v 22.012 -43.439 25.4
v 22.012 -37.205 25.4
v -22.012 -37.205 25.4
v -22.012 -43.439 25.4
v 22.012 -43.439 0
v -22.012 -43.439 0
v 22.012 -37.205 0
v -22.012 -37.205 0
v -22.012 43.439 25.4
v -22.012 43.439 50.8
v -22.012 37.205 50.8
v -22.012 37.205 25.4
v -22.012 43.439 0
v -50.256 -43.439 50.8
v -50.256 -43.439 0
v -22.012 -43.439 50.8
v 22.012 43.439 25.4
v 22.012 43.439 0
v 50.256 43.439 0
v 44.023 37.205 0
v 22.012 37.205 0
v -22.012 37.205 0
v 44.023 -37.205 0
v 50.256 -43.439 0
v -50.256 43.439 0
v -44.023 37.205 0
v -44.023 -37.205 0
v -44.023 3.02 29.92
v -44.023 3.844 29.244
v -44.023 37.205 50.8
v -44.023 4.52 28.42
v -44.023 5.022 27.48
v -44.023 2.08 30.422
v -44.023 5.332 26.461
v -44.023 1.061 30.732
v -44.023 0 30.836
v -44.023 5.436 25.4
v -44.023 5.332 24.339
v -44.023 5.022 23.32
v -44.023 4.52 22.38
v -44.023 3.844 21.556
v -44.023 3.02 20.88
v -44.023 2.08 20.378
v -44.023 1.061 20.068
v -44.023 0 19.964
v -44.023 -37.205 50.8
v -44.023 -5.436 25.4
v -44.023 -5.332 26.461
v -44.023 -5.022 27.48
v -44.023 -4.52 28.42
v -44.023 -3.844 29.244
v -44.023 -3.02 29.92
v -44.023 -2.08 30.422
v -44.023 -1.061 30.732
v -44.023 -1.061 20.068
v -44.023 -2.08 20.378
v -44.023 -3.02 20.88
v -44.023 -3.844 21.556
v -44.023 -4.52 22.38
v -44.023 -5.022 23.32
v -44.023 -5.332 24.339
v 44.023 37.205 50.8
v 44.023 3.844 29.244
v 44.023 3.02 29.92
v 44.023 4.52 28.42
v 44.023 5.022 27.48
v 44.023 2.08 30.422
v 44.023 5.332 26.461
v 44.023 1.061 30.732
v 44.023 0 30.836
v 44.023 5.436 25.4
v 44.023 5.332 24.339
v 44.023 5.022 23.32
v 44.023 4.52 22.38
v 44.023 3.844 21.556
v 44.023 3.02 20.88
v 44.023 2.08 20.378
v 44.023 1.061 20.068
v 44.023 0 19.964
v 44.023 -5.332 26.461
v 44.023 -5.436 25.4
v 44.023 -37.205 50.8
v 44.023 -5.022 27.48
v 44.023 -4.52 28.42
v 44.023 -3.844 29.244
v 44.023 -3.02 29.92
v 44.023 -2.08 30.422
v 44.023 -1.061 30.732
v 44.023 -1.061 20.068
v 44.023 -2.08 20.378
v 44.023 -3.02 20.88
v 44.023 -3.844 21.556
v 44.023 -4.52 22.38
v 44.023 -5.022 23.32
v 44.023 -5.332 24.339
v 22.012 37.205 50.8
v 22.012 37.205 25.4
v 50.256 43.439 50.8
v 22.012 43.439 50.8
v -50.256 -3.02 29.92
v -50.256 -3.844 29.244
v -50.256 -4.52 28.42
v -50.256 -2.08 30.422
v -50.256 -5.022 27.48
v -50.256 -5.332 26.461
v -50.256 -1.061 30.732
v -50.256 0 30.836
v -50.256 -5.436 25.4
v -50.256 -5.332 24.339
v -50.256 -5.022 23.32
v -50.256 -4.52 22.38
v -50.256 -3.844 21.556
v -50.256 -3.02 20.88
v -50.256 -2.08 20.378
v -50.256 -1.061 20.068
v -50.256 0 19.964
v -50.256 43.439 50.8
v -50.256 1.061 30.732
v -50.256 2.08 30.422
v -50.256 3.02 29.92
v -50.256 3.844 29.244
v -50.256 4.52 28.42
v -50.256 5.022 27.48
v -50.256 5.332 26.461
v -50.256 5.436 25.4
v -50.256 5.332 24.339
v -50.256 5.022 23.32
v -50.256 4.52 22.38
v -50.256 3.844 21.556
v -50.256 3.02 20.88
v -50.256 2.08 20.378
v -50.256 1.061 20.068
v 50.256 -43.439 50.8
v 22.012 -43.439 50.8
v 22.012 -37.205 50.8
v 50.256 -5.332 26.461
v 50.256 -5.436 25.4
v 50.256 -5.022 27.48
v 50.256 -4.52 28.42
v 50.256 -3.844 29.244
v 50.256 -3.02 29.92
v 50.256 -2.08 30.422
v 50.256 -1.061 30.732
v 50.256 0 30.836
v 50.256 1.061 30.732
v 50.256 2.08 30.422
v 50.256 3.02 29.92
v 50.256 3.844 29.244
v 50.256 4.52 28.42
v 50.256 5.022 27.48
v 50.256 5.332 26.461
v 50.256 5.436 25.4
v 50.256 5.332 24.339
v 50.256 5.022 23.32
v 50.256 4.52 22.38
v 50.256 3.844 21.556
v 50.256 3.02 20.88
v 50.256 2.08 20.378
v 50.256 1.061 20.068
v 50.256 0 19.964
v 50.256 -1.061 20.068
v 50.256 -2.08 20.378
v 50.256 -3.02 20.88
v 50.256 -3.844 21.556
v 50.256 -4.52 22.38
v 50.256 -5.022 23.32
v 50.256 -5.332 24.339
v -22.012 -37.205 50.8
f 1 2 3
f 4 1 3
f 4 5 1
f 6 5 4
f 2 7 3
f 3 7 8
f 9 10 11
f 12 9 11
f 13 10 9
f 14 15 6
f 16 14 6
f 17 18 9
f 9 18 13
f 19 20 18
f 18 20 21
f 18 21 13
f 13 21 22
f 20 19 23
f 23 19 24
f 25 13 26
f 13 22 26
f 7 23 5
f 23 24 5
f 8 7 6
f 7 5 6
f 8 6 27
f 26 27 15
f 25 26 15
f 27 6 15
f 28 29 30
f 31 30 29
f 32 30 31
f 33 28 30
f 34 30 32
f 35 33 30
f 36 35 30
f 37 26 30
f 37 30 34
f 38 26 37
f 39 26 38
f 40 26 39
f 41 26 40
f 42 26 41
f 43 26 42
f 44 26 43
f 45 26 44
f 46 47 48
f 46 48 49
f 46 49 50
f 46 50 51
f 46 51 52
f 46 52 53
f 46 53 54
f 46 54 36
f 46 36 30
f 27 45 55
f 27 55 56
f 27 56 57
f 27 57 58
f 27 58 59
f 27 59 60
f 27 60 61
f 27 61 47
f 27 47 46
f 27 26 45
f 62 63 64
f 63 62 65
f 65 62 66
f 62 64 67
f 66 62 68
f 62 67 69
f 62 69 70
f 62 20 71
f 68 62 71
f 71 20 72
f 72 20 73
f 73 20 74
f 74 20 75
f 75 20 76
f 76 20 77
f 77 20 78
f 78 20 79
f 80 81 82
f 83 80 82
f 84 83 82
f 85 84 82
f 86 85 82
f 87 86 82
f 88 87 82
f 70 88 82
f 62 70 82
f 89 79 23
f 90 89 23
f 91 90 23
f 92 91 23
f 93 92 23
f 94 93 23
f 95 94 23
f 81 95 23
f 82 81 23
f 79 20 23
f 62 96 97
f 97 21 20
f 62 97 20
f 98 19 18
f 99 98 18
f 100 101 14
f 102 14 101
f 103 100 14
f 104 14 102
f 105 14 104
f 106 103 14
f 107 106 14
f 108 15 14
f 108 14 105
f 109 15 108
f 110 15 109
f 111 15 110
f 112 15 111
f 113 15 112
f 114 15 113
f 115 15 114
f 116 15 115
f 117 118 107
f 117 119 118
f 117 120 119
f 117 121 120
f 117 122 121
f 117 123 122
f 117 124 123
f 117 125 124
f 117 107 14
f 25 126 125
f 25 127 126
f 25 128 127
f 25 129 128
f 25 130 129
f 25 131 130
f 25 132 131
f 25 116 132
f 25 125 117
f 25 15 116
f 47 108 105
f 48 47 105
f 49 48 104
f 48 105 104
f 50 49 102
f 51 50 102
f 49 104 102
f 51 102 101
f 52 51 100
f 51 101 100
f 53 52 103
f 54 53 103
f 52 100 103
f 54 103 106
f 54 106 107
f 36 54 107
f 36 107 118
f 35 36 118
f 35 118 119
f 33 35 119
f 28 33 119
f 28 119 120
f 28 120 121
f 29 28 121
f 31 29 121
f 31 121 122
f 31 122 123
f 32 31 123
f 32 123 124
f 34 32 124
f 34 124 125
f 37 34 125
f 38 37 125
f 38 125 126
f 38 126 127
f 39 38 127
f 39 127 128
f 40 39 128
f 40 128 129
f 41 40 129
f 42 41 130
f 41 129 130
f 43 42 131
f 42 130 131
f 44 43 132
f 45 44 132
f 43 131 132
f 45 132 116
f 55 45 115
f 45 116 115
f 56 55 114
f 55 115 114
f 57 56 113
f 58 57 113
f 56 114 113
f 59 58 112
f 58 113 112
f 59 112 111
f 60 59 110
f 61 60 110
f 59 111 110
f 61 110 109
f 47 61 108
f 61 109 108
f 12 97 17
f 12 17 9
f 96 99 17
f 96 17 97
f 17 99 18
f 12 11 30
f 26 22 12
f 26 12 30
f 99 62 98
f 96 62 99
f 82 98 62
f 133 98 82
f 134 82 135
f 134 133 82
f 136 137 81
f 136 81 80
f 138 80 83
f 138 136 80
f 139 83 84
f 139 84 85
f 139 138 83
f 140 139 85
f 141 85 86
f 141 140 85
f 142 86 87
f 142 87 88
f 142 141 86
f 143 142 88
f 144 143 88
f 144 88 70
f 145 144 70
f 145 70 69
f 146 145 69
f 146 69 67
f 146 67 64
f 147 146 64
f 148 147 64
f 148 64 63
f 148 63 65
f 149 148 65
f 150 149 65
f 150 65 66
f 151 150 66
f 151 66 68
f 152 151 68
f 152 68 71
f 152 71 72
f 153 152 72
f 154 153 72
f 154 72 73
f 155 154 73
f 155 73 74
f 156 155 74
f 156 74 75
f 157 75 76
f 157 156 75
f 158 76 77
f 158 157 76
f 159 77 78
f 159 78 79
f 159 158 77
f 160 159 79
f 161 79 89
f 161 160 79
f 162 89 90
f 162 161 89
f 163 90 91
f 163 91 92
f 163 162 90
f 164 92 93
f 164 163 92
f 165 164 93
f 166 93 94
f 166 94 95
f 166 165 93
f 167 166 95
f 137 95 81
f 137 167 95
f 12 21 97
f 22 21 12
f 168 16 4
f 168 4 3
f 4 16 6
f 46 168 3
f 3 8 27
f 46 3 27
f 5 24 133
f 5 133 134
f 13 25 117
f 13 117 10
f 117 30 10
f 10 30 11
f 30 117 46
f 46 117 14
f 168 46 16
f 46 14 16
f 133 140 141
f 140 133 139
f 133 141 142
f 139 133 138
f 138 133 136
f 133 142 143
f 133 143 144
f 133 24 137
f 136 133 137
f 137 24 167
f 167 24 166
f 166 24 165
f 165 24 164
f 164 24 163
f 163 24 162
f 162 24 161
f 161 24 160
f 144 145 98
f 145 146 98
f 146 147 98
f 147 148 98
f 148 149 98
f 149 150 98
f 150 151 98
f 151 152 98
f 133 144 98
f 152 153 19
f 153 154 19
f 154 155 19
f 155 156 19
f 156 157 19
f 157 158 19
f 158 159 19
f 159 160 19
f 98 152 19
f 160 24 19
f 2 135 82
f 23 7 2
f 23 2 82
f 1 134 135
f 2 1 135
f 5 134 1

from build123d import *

# Parameters (mm, degrees)
F1_DEPTH = 50.8
F0_W     = 22.011524
F0_H     = 6.233353
F2_DEPTH = 25.4
F4_R     = 5.436112
F5_DEPTH = 50.257401


with BuildPart() as f1:
    # F0 (on Top) → F1 (new body)
    with BuildSketch(Plane.XY):
        Polygon((-50.256401, -43.438673), (-22.011524, -43.438673), (-22.011524, -37.20532), (-44.023048, -37.20532), (-44.023048, 0), (-50.256401, 0), align=None)
    extrude(amount=F1_DEPTH)

    # F0 (on Top) → F2 (join)
    with BuildSketch(Plane.XY):
        with Locations((-11.005762, -40.321996)):
            Rectangle(F0_W, F0_H)
        Polygon((-50.256401, -43.438673), (-22.011524, -43.438673), (-22.011524, -37.20532), (-44.023048, -37.20532), (-44.023048, 0), (-50.256401, 0), align=None)
    extrude(amount=F2_DEPTH)

    # F3: F1 across plane


with BuildPart() as f1_1:
    add(f1.part)
    add(f1.part.mirror(Plane.XZ))

    # F4 (on face) → F5 (cut, through all)
    with BuildSketch(Plane(origin=(-50.256401, 0, 0), x_dir=(0, -1, 0), z_dir=(-1, 0, 0))):
        with Locations((0, 25.4)):
            Circle(F4_R)
    extrude(amount=-F5_DEPTH, mode=Mode.SUBTRACT)

    # F6: F1 across plane


with BuildPart() as f1_2:
    add(f1_1.part)
    add(f1_1.part.mirror(Plane.YZ))


solid = f1_2.part
